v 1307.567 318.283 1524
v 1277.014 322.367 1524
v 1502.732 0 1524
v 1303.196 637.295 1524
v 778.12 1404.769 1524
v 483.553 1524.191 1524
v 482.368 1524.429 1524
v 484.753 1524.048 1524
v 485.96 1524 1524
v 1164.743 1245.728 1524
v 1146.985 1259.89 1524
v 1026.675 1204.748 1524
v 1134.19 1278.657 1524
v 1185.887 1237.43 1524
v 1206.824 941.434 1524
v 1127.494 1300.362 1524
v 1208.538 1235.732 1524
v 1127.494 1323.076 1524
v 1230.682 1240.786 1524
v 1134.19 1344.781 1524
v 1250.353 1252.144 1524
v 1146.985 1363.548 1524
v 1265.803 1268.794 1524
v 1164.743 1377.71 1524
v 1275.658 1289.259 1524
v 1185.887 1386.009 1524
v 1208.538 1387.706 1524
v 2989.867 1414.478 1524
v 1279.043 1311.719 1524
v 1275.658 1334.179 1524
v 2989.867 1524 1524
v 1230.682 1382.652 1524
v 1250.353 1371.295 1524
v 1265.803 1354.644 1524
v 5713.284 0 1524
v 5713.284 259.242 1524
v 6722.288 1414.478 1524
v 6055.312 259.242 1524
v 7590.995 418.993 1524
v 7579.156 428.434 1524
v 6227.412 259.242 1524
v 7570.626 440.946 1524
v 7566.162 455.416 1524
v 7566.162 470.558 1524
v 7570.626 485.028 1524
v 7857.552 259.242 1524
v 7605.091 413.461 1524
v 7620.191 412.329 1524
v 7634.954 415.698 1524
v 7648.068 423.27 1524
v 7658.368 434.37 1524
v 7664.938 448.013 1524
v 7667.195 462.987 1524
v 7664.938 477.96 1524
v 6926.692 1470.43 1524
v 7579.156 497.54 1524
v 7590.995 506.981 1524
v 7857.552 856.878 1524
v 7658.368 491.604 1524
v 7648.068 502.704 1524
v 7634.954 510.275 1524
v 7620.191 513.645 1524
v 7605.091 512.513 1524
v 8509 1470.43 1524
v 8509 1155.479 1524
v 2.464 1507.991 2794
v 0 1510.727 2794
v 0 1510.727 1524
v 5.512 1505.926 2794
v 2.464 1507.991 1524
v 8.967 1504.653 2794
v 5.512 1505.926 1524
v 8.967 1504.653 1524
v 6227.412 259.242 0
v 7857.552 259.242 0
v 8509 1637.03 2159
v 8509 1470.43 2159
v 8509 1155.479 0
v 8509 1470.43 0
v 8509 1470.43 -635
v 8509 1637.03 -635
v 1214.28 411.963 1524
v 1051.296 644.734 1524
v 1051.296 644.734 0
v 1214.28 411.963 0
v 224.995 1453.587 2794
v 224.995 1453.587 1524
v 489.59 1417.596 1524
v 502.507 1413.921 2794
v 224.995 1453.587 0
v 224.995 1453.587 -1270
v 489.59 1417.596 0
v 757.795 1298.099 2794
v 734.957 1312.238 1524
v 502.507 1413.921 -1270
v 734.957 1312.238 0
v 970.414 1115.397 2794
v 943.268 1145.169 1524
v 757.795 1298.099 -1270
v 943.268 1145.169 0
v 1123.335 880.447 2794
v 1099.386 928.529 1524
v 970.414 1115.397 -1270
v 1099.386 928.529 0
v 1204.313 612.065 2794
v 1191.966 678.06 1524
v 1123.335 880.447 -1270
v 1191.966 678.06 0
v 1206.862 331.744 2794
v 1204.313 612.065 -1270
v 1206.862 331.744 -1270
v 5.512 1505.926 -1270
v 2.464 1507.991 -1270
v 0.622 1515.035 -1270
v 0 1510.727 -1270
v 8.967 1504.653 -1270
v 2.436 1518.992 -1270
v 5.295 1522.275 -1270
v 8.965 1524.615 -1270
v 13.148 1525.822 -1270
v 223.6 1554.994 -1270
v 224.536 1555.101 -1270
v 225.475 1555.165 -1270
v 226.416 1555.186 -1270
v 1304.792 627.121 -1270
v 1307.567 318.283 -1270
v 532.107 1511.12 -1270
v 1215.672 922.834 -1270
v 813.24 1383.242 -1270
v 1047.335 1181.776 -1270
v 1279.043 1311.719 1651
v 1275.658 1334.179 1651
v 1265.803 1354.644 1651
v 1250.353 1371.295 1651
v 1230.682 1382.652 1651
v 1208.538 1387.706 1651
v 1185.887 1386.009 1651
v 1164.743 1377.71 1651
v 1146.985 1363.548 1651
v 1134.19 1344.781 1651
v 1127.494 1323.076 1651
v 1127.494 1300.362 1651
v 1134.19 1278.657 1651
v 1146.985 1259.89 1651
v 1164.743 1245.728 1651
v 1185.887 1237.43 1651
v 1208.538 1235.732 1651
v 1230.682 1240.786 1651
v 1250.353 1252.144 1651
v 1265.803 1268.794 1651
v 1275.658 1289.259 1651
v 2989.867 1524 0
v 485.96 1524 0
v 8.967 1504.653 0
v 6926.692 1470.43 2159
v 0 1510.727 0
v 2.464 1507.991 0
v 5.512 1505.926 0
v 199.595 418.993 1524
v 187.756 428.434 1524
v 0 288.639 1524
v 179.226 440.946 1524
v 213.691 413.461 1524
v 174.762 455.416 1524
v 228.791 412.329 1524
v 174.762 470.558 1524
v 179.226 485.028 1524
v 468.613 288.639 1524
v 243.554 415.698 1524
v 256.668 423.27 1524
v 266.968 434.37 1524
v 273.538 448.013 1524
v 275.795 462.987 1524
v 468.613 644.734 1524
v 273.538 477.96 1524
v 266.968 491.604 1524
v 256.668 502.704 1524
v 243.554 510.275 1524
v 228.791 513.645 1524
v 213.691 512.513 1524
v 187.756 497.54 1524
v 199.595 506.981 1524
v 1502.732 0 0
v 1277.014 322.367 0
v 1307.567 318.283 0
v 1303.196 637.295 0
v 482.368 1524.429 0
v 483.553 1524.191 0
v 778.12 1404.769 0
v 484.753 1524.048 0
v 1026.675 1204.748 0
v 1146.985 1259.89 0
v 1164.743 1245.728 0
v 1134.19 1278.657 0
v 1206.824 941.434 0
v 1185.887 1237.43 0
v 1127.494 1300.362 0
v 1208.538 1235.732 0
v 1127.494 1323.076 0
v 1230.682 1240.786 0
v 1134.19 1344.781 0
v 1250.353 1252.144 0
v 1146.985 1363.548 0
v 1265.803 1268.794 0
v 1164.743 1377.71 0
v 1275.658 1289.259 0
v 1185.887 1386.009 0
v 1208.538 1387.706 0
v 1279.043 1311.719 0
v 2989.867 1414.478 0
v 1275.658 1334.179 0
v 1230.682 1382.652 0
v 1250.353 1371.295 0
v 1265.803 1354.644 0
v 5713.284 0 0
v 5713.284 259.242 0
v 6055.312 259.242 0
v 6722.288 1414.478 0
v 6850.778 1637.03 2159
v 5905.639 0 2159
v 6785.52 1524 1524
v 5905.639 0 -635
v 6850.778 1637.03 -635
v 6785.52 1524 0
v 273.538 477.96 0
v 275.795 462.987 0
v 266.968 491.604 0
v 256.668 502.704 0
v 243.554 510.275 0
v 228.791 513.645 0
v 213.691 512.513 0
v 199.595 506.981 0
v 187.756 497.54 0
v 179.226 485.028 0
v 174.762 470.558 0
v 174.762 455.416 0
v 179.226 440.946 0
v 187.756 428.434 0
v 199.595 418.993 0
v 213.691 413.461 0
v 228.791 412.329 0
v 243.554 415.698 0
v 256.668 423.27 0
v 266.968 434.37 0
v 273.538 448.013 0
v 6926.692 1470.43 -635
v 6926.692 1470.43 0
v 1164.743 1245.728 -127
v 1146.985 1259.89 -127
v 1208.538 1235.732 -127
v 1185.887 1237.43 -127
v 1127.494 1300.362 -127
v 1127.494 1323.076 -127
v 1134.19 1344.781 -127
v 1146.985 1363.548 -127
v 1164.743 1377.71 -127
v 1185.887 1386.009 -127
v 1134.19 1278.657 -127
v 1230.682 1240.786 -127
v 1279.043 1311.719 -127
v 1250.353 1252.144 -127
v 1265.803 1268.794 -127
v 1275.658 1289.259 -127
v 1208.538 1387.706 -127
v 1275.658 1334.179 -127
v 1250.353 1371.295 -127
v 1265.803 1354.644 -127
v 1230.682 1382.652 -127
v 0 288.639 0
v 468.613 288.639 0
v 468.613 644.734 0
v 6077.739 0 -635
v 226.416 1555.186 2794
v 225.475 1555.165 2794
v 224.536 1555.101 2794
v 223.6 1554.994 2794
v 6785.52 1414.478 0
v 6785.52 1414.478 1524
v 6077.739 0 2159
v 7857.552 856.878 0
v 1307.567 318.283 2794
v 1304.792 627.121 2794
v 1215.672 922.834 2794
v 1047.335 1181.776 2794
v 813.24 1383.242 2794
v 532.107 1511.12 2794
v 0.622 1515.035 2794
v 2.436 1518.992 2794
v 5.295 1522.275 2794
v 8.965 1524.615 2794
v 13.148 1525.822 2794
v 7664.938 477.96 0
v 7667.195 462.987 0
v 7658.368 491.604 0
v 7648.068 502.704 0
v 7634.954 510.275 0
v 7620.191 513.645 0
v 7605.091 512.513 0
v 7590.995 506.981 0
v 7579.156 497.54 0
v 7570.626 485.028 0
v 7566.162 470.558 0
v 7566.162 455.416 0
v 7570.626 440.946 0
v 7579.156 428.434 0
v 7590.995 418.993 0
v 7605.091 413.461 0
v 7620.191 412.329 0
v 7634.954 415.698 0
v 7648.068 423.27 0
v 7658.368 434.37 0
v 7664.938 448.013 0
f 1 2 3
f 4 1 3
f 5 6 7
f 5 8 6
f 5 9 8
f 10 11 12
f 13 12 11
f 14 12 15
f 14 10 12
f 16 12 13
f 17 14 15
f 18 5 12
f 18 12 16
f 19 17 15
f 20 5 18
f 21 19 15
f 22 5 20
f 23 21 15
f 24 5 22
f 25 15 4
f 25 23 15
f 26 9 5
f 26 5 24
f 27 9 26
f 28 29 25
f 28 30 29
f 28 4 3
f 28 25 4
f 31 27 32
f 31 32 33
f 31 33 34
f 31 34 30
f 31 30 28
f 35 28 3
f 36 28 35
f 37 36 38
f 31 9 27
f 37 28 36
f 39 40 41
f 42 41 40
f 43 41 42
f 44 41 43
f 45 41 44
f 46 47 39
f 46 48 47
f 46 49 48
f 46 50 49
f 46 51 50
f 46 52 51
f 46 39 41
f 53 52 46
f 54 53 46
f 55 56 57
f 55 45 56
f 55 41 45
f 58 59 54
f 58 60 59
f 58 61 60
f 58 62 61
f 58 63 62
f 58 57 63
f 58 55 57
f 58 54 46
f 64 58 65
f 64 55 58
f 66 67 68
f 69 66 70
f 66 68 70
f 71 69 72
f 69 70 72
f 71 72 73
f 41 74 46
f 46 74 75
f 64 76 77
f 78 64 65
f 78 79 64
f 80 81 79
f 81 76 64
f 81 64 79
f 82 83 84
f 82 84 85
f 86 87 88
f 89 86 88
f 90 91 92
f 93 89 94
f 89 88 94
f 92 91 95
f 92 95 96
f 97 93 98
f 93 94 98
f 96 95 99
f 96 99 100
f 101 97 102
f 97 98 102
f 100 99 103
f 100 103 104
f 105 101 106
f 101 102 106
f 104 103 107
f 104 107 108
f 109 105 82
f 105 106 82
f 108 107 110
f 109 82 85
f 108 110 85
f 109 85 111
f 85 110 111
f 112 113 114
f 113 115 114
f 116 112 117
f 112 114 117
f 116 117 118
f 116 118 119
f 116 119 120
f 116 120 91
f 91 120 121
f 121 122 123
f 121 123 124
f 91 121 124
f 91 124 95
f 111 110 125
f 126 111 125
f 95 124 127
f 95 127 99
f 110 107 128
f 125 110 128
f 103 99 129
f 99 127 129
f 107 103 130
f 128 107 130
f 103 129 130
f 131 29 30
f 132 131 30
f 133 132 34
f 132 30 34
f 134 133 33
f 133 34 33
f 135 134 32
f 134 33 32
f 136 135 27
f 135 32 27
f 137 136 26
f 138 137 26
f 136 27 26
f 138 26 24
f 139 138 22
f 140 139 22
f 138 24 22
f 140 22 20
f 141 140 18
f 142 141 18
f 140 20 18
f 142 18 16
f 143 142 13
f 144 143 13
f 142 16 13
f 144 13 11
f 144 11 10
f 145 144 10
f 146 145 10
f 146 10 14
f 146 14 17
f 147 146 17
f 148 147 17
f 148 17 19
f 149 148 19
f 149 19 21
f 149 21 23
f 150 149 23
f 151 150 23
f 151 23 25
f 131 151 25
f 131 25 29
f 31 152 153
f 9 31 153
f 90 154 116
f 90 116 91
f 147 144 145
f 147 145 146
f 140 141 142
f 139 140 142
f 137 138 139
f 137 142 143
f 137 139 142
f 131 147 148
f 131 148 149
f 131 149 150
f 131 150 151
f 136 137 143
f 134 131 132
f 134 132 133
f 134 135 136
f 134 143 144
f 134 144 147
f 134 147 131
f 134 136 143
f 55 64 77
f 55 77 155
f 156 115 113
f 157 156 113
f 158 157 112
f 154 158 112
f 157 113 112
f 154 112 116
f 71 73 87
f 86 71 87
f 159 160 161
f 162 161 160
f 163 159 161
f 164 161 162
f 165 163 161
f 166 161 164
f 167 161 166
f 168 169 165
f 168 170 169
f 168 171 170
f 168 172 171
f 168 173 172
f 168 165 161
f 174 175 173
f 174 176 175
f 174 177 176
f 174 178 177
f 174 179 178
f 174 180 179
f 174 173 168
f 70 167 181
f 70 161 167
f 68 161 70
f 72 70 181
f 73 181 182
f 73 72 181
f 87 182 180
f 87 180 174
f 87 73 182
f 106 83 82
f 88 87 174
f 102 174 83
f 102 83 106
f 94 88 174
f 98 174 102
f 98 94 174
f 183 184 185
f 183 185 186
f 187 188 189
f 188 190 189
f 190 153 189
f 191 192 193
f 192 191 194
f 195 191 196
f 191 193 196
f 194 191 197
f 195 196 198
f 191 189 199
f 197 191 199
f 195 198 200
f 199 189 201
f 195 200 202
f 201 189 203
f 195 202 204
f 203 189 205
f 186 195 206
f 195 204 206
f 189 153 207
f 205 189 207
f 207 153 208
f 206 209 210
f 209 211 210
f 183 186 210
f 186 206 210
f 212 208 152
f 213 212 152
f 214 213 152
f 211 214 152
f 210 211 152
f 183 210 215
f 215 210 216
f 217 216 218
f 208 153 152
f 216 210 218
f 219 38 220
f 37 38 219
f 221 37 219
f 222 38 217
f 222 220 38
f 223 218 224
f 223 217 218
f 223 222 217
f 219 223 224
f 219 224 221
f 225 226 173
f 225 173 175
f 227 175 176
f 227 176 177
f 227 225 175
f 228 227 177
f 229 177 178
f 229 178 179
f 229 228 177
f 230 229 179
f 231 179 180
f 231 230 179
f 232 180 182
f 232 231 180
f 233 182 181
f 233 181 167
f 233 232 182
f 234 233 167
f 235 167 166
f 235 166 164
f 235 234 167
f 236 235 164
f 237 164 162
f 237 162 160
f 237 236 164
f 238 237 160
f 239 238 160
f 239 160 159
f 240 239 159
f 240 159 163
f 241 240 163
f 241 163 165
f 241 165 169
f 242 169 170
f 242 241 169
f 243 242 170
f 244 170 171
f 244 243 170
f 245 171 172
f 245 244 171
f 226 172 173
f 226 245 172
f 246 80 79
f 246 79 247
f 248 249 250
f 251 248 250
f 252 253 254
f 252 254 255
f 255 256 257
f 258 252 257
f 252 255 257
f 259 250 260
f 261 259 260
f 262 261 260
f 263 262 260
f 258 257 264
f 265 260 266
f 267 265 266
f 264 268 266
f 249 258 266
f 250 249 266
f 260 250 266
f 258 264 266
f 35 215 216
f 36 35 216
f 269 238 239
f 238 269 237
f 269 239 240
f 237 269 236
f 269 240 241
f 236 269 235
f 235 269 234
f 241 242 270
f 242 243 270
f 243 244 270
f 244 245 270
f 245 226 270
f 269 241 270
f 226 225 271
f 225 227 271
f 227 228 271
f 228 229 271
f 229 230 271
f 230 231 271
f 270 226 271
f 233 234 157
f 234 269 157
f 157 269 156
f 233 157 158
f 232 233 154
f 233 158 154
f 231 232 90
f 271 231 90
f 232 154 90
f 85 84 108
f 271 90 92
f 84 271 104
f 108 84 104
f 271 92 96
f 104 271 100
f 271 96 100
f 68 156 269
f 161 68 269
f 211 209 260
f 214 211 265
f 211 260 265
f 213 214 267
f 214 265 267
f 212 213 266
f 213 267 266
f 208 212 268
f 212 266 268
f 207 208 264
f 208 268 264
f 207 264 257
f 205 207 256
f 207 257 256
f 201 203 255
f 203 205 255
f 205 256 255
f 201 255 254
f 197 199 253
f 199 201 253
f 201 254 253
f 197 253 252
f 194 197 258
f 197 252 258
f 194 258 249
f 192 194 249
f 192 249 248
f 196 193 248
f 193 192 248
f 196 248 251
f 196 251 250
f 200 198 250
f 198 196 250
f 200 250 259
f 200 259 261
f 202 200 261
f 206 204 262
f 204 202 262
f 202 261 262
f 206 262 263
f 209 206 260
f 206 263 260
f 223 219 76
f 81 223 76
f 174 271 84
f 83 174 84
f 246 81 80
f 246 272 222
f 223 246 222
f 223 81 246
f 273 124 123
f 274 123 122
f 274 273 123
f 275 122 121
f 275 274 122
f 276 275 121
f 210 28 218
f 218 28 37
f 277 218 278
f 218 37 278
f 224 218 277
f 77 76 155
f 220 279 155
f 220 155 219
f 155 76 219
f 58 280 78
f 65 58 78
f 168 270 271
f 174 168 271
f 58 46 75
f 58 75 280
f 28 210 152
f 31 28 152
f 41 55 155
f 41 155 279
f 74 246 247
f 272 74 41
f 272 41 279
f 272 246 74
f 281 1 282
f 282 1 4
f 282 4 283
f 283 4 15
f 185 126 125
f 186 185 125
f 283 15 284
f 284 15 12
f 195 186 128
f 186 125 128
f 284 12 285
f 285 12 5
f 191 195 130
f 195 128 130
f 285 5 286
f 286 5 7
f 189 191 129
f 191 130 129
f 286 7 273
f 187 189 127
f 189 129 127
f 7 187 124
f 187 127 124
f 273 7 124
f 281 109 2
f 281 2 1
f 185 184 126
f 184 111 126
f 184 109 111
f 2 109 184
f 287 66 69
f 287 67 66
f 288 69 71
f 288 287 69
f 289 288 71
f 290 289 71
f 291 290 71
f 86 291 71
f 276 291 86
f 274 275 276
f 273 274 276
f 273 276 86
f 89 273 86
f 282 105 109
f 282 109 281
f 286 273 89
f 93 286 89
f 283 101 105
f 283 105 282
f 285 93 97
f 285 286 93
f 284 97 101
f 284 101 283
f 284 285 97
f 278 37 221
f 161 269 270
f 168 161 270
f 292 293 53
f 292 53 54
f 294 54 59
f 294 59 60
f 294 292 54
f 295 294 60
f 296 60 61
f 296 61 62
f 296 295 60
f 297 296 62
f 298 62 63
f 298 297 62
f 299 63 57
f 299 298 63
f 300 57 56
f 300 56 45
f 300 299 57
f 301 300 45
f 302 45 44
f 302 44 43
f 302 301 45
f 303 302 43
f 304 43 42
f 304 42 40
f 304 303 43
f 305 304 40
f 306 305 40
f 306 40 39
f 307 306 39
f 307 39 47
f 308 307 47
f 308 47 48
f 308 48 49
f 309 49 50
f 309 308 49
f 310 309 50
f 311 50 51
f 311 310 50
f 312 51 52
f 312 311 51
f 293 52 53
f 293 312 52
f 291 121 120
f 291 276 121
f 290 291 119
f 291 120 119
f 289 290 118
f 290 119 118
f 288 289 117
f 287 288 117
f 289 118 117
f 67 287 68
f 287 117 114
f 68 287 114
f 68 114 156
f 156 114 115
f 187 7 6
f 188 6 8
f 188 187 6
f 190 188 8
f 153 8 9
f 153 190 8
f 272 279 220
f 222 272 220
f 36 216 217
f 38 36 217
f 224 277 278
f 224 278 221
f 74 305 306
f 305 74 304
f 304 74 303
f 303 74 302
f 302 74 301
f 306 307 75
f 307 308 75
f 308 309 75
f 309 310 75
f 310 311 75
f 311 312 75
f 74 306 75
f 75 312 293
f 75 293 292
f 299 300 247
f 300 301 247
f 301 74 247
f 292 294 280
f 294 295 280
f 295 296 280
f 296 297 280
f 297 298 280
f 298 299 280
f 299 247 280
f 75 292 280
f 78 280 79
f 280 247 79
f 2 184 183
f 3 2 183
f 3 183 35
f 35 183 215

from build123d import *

# Parameters (mm, degrees)
SKETCH1_R                = 50.8
BOSS_EXTRUDE1_DEPTH      = 1524
BOSS_EXTRUDE2_DEPTH      = 1270
BOSS_EXTRUDE2_DEPTH_BACK = 2794
BOSS_EXTRUDE3_DEPTH      = 635
BOSS_EXTRUDE3_DEPTH_BACK = 2159
BOSS_EXTRUDE5_DEPTH      = 127
BOSS_EXTRUDE5_DEPTH_BACK = 1651
SKETCH5_R                = 76.2
BOSS_EXTRUDE6_DEPTH      = 4064
BOSS_EXTRUDE7_START      = -4064
BOSS_EXTRUDE7_DEPTH      = 4064
FILLET1_R                = 20.32
FILLET2_R                = 15.24
FILLET3_R                = 15.24
FILLET4_R                = 15.24
FILLET5_R                = 15.24
SKETCH4_W                = 3795.653322381
SKETCH4_H                = 109.522208094
CUT_EXTRUDE1_DEPTH       = 1524


with BuildPart() as part:
    # Sketch1 → Boss-Extrude1 (new body)
    with BuildSketch(Plane.XY):
        Polygon((0, 288.639346487), (468.613209277, 288.639346487), (468.613209277, 644.7339374), (1051.2960708, 644.7339374), (1178.553429838, 462.986885422), (1502.731938743, 0), (5713.284119233, 0), (5713.284119233, 259.241704477), (7857.552449038, 259.241704477), (7857.552449038, 856.878061068), (8509, 1155.479490671), (8509, 1524), (0, 1524), align=None)
        with Locations((224.995009204, 462.986885422)):
            Circle(SKETCH1_R, mode=Mode.SUBTRACT)
        with Locations((7616.395009204, 462.986885422)):
            Circle(SKETCH1_R, mode=Mode.SUBTRACT)
    extrude(amount=BOSS_EXTRUDE1_DEPTH)

    # Sketch2 → Boss-Extrude2 (add, two sides: drawn at the far end of the back side and taken through both)
    with BuildSketch(Plane.XY.offset(1524).offset(-BOSS_EXTRUDE2_DEPTH_BACK)):
        with BuildLine():
            Line((1206.862433225, 331.743898385), (1307.566784406, 318.283079202))
            ThreePointArc((1307.566784406, 318.283079202), (1046.86675624, 1182.311340326), (224.995009204, 1555.186885422))
            Line((224.995009204, 1555.186885422), (224.995009204, 1453.586885422))
            ThreePointArc((224.995009204, 1453.586885422), (970.413570469, 1115.397437544), (1206.862433225, 331.743898385))
        make_face()
    extrude(amount=BOSS_EXTRUDE2_DEPTH + BOSS_EXTRUDE2_DEPTH_BACK)

    # Sketch3 → Boss-Extrude3 (add, two sides: drawn at the far end of the back side and taken through both)
    with BuildSketch(Plane.XY.offset(1524).offset(-BOSS_EXTRUDE3_DEPTH_BACK)):
        Polygon((5905.638550103, 0), (6850.778261275, 1637.03), (8509, 1637.03), (8509, 1470.430007997), (6926.6918571, 1470.430007997), (6077.738696158, 0), align=None)
    extrude(amount=BOSS_EXTRUDE3_DEPTH + BOSS_EXTRUDE3_DEPTH_BACK)

    # Sketch5 → Boss-Extrude5 (add, two sides: drawn at the far end of the back side and taken through both)
    with BuildSketch(Plane.XY.offset(1524).offset(-BOSS_EXTRUDE5_DEPTH_BACK)):
        with Locations((1202.84340516, 1311.719073043)):
            Circle(SKETCH5_R)
    extrude(amount=BOSS_EXTRUDE5_DEPTH + BOSS_EXTRUDE5_DEPTH_BACK)

    # Sketch7 → Boss-Extrude6 (add, through all)
    with BuildSketch(Plane.XY.offset(2794)):
        Polygon((224.995009204, 1555.186885422), (0, 1524), (224.995009204, 1524), align=None)
    extrude(amount=-BOSS_EXTRUDE6_DEPTH)

    # Sketch8 → Boss-Extrude7 (add)
    with BuildSketch(Plane.XY.offset(2794).offset(BOSS_EXTRUDE7_START)):
        Polygon((0, 1506.772554526), (224.995009204, 1453.586885422), (224.995009204, 1524), (0, 1524), align=None)
    extrude(amount=BOSS_EXTRUDE7_DEPTH)

    # Fillet1
    fillet1_edges = [part.edges().sort_by_distance(p)[0] for p in [
        (224.995009204, 1555.186885422, 762),
    ]]
    fillet(fillet1_edges, radius=FILLET1_R)

    # Fillet2
    fillet2_edges = [part.edges().sort_by_distance(p)[0] for p in [
        (0, 1524, 762),
    ]]
    fillet(fillet2_edges, radius=FILLET2_R)

    # Fillet3
    fillet3_edges = [part.edges().sort_by_distance(p)[0] for p in [
        (484.132059225, 1524, 762),
    ]]
    fillet(fillet3_edges, radius=FILLET3_R)

    # Fillet4
    # the kernel refuses this fillet: 15.24 mm, written as the material it takes off along each edge
    with BuildSketch(Plane(origin=(0, 1506.772554526, 1524), x_dir=(0.9731797416711222, -0.23004606147667025, 0), z_dir=(0, 0, 1))) as fillet4_piece_1:
        with BuildLine():
            CenterArc((9.213734751, 15.24), FILLET4_R, 228.374143348, 41.625856652)
            Line((-0.909642728, 3.848124456), (-1.112110278, 3.620286945))
            ThreePointArc((-1.112110278, 3.620286945), (-0.751446549, 1.853944188), (-0.296625185, -0.07011804))
            Line((-0.296625185, -0.07011804), (0, -0.3048))
            Line((0, -0.3048), (9.213734751, -0.3048))
            Line((9.213734751, -0.3048), (9.213734751, 0))
        make_face()
    extrude(amount=1293.034336878, mode=Mode.SUBTRACT)

    # Fillet5
    # the kernel refuses this fillet: 15.24 mm, written as the material it takes off along each edge
    with BuildSketch(Plane(origin=(0, 1506.772554526, -1293.034336878), x_dir=(0.9731797416711221, -0.23004606147667092, 0), z_dir=(0, 0, 1))) as fillet5_piece_1:
        with BuildLine():
            CenterArc((9.213734751, 15.24), FILLET5_R, 228.374143348, 41.625856652)
            Line((-0.909642728, 3.848124456), (-1.112110278, 3.620286945))
            ThreePointArc((-1.112110278, 3.620286945), (-0.751446549, 1.853944188), (-0.296625185, -0.07011804))
            Line((-0.296625185, -0.07011804), (0, -0.3048))
            Line((0, -0.3048), (9.213734751, -0.3048))
            Line((9.213734751, -0.3048), (9.213734751, 0))
        make_face()
    extrude(amount=1293.034336878, mode=Mode.SUBTRACT)

    # Sketch4 → Cut-Extrude1 (cut)
    with BuildSketch(Plane.XY.offset(1524)):
        with Locations((4887.693699158, 1469.238895953)):
            Rectangle(SKETCH4_W, SKETCH4_H)
    extrude(amount=-CUT_EXTRUDE1_DEPTH, mode=Mode.SUBTRACT)


solid = part.part
